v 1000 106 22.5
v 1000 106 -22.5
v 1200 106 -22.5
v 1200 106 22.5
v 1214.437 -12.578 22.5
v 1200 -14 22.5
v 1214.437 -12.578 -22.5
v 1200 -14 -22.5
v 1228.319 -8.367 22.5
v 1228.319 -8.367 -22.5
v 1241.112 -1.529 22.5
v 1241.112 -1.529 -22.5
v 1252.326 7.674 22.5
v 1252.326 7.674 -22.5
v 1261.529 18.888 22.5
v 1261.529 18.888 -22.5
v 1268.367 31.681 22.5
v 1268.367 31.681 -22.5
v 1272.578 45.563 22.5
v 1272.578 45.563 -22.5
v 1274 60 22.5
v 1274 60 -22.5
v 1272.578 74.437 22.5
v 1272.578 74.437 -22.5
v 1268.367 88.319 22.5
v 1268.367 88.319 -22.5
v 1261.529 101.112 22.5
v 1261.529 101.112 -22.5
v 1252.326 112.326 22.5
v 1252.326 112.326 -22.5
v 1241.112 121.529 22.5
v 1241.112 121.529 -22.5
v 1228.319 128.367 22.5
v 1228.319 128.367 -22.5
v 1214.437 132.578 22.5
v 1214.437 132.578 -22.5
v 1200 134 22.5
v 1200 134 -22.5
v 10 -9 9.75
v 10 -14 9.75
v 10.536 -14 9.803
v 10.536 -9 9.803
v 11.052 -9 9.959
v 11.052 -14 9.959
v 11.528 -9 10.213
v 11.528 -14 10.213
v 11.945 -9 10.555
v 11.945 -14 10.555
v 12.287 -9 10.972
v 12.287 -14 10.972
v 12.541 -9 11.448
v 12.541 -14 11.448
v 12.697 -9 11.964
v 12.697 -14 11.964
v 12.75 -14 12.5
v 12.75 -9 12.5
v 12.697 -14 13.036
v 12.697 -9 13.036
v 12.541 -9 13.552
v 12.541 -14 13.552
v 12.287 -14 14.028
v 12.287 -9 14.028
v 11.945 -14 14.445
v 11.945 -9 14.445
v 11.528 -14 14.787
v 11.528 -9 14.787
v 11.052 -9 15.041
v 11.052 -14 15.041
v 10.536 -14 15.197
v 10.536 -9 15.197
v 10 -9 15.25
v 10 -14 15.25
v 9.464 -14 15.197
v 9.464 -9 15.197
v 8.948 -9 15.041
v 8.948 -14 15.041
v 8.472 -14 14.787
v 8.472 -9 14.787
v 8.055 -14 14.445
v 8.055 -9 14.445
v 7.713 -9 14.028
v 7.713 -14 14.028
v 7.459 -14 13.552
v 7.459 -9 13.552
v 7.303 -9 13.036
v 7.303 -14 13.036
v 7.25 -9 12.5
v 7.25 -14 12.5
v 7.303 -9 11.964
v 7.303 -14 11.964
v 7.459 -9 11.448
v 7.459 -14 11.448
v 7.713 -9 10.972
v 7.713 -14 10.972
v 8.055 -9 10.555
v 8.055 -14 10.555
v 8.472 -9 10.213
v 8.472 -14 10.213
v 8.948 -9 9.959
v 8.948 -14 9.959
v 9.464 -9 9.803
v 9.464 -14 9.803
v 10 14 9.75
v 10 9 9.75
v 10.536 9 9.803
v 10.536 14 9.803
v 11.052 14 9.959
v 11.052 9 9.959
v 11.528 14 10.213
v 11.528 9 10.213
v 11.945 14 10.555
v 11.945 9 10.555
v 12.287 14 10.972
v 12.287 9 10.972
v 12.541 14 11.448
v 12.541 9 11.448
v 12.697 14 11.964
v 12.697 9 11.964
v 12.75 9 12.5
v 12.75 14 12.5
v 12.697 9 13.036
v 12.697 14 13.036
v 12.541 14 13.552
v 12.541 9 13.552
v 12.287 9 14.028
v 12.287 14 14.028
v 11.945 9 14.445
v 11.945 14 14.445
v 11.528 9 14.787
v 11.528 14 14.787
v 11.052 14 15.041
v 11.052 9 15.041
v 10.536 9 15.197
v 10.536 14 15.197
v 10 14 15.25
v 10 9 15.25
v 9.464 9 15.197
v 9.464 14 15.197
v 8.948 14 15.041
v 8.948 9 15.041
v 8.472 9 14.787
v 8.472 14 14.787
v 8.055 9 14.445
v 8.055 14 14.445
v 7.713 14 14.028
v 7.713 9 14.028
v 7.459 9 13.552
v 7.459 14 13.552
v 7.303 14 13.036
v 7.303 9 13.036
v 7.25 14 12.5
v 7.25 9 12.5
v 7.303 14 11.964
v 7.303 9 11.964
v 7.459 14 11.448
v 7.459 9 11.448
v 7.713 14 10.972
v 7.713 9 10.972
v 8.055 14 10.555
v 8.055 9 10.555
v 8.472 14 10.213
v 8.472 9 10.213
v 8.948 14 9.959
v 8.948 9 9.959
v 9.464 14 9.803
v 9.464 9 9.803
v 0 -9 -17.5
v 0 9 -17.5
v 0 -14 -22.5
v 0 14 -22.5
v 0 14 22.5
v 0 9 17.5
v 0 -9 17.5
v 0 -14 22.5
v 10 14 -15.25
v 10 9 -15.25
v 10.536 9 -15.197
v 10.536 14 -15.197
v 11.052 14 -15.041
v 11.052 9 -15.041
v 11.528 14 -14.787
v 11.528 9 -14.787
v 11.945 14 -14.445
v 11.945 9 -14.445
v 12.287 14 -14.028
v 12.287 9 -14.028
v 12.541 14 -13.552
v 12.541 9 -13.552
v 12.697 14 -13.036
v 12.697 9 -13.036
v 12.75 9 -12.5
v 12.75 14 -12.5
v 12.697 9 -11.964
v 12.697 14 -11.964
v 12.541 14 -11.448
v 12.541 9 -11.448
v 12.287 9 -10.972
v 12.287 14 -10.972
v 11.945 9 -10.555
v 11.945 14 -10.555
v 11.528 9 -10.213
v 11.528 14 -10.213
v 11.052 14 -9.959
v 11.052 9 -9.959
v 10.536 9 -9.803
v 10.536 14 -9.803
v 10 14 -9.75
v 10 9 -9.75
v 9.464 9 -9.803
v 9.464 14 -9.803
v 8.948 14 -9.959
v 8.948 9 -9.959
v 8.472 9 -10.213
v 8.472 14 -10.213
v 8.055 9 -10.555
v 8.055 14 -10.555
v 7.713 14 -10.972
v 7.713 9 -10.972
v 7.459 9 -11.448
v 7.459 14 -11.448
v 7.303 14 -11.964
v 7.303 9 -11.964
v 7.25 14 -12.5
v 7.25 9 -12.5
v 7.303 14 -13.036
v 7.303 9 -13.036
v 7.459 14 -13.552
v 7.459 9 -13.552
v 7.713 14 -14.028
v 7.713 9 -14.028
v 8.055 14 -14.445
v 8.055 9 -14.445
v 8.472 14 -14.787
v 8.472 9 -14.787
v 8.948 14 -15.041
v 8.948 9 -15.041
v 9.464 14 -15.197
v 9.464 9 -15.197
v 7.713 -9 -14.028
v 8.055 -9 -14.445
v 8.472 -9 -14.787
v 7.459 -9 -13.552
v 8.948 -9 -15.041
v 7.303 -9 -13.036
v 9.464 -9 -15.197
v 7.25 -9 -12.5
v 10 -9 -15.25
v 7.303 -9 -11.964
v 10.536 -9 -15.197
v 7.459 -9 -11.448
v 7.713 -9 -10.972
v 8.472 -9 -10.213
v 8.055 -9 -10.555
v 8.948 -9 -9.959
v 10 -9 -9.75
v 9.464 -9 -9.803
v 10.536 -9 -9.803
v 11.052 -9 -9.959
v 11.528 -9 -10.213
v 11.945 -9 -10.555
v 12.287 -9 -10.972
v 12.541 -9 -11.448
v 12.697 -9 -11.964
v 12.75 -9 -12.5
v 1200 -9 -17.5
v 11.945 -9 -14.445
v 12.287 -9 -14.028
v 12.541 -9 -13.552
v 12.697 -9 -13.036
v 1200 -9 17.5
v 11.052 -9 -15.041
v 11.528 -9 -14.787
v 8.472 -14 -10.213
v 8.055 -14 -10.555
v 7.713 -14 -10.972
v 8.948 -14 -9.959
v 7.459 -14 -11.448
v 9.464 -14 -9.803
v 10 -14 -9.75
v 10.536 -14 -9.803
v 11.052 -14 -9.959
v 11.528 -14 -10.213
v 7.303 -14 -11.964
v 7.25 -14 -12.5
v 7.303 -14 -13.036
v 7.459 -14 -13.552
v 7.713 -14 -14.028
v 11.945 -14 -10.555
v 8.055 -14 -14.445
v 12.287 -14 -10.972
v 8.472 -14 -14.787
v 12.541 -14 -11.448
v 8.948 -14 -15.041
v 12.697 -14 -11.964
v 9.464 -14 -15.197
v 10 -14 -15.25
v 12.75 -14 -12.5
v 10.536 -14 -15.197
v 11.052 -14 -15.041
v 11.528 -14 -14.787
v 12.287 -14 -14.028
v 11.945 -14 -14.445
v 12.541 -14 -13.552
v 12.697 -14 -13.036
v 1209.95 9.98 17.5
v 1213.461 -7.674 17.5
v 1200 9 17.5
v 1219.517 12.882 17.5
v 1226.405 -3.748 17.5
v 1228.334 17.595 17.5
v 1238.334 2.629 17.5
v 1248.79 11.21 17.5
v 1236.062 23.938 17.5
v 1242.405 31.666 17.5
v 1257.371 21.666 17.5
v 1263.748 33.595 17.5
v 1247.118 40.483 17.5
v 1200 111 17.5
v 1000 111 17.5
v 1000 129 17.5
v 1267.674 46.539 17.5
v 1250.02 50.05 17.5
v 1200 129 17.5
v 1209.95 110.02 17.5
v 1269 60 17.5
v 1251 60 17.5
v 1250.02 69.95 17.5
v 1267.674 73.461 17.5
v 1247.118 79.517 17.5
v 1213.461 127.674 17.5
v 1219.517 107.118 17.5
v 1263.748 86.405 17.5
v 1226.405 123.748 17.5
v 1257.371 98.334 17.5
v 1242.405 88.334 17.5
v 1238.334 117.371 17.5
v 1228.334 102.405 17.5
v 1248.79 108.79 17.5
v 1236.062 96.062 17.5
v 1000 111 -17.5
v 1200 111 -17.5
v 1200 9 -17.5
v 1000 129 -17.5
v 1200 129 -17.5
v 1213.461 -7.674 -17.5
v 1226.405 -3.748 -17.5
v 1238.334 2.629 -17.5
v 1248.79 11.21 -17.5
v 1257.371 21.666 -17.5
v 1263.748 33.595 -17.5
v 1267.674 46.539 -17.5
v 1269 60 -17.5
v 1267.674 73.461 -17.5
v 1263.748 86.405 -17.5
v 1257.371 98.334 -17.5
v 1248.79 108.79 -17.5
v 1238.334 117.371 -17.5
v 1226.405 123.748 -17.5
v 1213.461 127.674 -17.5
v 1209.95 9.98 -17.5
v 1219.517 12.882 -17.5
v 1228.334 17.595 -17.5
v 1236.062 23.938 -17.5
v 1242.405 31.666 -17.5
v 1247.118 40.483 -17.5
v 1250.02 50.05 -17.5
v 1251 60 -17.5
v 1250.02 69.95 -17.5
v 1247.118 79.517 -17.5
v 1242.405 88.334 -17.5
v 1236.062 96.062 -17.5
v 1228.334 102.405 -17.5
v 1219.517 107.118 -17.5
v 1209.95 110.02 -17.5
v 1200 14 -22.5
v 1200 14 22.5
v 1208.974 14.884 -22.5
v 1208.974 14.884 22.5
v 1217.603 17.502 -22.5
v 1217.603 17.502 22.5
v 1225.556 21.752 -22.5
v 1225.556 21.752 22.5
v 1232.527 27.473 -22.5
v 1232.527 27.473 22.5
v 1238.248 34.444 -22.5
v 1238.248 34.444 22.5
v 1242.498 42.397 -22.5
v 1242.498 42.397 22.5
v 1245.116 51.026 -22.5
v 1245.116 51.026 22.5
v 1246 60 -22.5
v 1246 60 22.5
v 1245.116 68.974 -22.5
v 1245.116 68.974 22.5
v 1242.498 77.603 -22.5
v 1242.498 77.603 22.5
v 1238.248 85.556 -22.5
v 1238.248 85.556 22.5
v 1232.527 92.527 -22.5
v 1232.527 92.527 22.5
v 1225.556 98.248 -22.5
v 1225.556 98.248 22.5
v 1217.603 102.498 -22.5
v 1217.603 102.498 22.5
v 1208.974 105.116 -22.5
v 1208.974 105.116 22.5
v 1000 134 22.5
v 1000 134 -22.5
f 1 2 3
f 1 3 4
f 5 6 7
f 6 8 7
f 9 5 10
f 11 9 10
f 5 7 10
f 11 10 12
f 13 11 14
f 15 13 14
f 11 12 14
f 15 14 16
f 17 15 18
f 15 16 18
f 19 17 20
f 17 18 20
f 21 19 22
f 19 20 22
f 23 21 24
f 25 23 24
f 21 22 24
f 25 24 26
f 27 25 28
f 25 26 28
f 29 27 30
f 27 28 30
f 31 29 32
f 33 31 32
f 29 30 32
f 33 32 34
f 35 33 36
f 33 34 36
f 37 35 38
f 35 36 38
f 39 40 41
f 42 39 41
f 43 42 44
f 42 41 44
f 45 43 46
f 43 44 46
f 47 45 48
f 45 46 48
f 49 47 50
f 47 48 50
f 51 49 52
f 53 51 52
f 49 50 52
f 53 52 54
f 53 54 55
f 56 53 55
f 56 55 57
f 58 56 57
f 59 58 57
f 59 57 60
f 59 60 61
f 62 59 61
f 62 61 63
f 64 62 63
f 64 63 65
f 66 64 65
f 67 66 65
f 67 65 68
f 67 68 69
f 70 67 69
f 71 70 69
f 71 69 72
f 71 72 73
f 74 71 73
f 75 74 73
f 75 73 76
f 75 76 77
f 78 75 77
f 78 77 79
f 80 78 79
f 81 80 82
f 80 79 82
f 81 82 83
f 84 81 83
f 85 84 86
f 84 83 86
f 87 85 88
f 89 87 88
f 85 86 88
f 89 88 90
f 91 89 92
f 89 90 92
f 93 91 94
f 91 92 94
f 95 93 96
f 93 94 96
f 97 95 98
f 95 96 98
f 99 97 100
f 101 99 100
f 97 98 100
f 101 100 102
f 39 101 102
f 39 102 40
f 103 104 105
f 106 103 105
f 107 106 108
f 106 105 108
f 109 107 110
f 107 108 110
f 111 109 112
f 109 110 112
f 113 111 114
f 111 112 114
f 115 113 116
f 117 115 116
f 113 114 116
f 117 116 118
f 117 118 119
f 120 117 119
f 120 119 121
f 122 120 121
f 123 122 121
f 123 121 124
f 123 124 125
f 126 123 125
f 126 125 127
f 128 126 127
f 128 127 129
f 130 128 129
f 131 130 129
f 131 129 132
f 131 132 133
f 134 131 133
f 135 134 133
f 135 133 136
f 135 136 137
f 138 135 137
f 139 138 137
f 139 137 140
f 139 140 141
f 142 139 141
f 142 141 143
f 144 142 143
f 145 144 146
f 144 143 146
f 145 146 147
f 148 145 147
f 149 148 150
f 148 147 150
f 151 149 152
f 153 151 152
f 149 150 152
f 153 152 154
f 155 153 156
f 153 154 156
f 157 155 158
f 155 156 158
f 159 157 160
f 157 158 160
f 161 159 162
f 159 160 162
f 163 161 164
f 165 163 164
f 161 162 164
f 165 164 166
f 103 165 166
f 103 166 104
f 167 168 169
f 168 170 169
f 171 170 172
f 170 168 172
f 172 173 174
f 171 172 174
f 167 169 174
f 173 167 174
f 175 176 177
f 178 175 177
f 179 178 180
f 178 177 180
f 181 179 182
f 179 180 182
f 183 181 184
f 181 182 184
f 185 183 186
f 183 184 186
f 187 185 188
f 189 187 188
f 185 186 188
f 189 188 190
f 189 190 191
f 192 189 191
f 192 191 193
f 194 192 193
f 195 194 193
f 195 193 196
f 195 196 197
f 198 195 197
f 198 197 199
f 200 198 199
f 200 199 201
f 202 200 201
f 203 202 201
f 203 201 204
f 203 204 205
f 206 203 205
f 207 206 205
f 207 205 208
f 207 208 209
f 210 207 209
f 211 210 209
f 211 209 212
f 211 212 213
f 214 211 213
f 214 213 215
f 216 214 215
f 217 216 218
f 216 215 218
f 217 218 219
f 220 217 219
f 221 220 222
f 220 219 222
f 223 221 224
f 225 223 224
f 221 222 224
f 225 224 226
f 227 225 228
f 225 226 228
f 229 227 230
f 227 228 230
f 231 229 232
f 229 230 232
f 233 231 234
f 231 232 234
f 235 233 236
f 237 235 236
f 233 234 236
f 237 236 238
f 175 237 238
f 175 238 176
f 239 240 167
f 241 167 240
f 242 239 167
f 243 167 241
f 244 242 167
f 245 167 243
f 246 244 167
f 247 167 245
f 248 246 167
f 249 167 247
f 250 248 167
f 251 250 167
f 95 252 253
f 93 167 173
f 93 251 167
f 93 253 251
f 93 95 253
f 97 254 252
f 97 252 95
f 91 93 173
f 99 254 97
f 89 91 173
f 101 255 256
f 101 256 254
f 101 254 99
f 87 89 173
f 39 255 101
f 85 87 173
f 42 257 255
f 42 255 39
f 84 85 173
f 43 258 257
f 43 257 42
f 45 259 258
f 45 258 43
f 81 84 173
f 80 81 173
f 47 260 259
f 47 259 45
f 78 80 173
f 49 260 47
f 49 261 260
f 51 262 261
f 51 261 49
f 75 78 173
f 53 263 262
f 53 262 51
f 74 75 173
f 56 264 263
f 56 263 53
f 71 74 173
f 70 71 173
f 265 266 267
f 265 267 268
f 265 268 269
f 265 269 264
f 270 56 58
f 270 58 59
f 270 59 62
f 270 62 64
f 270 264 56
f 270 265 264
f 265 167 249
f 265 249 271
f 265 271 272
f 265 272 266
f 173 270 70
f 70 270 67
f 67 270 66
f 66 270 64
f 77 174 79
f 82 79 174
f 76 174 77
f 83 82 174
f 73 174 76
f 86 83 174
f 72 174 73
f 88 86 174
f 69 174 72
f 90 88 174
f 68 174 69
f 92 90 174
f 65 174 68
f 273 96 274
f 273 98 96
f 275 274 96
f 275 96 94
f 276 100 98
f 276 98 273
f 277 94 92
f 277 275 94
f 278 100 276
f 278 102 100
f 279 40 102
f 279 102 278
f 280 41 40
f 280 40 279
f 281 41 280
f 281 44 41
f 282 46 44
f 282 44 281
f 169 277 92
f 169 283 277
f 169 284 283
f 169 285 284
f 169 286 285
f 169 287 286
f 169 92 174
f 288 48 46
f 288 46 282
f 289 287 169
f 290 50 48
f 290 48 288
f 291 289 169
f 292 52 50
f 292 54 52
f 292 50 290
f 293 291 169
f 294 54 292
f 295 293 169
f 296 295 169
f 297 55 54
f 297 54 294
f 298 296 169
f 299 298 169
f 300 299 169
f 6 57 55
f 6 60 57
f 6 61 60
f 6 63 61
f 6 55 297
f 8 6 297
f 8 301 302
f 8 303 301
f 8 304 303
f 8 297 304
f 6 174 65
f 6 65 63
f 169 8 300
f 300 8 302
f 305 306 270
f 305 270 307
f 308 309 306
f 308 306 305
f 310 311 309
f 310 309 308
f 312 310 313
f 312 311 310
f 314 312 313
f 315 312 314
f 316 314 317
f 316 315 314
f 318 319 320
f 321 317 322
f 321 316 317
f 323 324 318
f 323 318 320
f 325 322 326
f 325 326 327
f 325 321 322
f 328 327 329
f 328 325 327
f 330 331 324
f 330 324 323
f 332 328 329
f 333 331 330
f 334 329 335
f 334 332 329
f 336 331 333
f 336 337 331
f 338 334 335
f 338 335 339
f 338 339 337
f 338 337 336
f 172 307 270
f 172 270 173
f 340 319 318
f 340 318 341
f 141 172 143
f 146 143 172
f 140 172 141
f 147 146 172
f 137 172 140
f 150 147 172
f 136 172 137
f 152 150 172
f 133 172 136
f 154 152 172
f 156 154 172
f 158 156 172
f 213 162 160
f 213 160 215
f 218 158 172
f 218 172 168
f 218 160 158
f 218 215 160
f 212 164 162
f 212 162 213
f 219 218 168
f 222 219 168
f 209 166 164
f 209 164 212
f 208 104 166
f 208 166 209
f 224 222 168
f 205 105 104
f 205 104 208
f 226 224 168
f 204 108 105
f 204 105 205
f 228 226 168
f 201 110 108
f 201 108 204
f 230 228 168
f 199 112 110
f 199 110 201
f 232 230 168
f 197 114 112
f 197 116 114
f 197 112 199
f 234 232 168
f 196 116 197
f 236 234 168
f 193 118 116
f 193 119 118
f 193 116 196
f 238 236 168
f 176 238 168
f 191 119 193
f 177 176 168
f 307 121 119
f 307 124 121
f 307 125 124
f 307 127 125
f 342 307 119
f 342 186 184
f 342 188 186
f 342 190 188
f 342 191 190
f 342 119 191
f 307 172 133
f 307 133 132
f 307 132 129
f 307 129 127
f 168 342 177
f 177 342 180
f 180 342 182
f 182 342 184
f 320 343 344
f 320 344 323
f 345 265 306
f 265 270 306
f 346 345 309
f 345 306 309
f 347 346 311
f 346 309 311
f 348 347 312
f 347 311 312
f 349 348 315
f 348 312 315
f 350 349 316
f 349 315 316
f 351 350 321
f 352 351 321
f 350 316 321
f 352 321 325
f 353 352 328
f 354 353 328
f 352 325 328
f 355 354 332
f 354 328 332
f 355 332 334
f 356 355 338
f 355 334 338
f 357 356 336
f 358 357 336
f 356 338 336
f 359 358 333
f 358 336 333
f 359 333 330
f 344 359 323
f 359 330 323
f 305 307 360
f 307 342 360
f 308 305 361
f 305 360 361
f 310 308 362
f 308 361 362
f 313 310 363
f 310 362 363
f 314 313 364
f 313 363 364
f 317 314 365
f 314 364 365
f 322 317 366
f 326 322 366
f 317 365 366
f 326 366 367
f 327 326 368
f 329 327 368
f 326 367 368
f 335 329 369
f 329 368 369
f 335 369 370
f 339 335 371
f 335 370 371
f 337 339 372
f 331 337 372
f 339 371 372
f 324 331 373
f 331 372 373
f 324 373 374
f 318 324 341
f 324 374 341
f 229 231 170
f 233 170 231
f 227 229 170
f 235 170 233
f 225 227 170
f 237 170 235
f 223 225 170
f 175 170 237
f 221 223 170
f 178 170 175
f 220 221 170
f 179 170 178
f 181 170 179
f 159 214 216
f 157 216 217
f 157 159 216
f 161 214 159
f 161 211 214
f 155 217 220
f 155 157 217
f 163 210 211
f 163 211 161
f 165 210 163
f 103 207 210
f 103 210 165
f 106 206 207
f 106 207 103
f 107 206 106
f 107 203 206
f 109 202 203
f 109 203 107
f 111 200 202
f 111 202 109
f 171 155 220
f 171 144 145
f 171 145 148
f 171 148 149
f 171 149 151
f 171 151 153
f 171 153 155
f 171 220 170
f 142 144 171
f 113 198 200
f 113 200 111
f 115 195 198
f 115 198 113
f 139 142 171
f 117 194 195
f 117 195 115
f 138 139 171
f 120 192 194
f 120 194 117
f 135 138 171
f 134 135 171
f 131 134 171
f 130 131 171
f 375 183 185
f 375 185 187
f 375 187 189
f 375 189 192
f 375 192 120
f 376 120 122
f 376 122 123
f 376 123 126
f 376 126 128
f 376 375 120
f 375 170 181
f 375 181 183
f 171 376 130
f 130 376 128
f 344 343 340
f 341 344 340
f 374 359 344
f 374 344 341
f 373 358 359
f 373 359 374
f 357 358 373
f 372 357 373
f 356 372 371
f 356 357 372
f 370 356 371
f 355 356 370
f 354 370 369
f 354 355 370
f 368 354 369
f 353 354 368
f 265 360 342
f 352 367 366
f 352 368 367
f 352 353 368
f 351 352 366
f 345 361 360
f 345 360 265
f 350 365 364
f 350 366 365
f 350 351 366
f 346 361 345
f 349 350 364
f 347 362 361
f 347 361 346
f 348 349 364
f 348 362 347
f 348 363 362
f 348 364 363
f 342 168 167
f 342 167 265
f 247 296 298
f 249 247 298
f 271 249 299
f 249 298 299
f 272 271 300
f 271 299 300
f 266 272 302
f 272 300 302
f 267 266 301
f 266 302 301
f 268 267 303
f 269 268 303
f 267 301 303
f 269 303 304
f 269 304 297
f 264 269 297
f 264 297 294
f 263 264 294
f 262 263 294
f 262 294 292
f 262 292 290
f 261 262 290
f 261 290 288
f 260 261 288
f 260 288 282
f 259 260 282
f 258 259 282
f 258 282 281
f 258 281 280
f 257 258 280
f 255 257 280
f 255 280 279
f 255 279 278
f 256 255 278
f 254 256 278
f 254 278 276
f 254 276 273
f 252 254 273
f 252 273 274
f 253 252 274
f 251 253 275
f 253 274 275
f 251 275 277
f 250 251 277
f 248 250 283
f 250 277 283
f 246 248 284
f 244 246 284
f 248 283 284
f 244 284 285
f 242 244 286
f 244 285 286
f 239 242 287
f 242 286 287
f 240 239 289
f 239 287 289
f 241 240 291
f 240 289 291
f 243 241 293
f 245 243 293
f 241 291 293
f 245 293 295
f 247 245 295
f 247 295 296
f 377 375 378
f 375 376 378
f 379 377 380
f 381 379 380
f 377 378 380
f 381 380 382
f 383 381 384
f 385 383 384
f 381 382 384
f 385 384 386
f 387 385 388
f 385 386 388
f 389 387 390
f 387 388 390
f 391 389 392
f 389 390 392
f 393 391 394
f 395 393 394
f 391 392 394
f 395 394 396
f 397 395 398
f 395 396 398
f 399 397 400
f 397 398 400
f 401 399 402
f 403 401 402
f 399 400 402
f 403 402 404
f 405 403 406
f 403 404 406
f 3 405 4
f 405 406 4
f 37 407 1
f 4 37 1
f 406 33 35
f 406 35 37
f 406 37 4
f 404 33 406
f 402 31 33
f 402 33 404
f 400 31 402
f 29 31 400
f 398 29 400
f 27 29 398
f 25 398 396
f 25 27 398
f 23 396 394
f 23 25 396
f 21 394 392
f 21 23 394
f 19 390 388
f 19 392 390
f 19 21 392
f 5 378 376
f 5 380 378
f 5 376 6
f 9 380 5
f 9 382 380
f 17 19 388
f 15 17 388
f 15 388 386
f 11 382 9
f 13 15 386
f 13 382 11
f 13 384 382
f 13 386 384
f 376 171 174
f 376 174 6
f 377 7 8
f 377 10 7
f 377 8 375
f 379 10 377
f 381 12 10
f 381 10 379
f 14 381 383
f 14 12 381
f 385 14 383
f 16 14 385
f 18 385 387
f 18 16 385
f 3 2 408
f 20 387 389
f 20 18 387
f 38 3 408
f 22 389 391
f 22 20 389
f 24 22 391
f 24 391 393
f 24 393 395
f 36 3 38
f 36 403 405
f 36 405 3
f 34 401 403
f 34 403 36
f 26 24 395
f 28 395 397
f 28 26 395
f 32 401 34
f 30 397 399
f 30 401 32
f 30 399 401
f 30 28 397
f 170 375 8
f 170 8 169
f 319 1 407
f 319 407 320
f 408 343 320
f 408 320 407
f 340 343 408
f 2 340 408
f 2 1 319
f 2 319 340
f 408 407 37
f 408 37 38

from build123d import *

# Parameters (mm, degrees)
SKETCH_2_W              = 45
SKETCH_2_H              = 28
SKETCH_2_W_2            = 35
SKETCH_2_H_2            = 18
HOLE_WIZARD_5_5_5_5_1_D = 5.5


with BuildPart() as part:
    # 扫描1: sweep along a path in 草图1
    with BuildLine(Plane.XY) as sweep_1_path:
        Line((0, 0), (1200, 0))
        ThreePointArc((1200, 0), (1260, 60), (1200, 120))
        Line((1200, 120), (1000, 120))
    # 草图2 → 扫描1 (sweep)
    with BuildSketch(Plane(origin=(0, 0, 0), x_dir=(0, 0, -1), z_dir=(1, 0, 0))):
        Rectangle(SKETCH_2_W, SKETCH_2_H)
        Rectangle(SKETCH_2_W_2, SKETCH_2_H_2, mode=Mode.SUBTRACT)
    sweep(path=sweep_1_path.line)

    # Ø5.5 (5.5) 直径孔1 (through all)
    with Locations(Plane(origin=(10, 14, -12.5), x_dir=(0, 0, 1), z_dir=(0, 1, 0))):
        with Locations((0, 0), (25, 0)):
            Hole(HOLE_WIZARD_5_5_5_5_1_D / 2)


solid = part.part
